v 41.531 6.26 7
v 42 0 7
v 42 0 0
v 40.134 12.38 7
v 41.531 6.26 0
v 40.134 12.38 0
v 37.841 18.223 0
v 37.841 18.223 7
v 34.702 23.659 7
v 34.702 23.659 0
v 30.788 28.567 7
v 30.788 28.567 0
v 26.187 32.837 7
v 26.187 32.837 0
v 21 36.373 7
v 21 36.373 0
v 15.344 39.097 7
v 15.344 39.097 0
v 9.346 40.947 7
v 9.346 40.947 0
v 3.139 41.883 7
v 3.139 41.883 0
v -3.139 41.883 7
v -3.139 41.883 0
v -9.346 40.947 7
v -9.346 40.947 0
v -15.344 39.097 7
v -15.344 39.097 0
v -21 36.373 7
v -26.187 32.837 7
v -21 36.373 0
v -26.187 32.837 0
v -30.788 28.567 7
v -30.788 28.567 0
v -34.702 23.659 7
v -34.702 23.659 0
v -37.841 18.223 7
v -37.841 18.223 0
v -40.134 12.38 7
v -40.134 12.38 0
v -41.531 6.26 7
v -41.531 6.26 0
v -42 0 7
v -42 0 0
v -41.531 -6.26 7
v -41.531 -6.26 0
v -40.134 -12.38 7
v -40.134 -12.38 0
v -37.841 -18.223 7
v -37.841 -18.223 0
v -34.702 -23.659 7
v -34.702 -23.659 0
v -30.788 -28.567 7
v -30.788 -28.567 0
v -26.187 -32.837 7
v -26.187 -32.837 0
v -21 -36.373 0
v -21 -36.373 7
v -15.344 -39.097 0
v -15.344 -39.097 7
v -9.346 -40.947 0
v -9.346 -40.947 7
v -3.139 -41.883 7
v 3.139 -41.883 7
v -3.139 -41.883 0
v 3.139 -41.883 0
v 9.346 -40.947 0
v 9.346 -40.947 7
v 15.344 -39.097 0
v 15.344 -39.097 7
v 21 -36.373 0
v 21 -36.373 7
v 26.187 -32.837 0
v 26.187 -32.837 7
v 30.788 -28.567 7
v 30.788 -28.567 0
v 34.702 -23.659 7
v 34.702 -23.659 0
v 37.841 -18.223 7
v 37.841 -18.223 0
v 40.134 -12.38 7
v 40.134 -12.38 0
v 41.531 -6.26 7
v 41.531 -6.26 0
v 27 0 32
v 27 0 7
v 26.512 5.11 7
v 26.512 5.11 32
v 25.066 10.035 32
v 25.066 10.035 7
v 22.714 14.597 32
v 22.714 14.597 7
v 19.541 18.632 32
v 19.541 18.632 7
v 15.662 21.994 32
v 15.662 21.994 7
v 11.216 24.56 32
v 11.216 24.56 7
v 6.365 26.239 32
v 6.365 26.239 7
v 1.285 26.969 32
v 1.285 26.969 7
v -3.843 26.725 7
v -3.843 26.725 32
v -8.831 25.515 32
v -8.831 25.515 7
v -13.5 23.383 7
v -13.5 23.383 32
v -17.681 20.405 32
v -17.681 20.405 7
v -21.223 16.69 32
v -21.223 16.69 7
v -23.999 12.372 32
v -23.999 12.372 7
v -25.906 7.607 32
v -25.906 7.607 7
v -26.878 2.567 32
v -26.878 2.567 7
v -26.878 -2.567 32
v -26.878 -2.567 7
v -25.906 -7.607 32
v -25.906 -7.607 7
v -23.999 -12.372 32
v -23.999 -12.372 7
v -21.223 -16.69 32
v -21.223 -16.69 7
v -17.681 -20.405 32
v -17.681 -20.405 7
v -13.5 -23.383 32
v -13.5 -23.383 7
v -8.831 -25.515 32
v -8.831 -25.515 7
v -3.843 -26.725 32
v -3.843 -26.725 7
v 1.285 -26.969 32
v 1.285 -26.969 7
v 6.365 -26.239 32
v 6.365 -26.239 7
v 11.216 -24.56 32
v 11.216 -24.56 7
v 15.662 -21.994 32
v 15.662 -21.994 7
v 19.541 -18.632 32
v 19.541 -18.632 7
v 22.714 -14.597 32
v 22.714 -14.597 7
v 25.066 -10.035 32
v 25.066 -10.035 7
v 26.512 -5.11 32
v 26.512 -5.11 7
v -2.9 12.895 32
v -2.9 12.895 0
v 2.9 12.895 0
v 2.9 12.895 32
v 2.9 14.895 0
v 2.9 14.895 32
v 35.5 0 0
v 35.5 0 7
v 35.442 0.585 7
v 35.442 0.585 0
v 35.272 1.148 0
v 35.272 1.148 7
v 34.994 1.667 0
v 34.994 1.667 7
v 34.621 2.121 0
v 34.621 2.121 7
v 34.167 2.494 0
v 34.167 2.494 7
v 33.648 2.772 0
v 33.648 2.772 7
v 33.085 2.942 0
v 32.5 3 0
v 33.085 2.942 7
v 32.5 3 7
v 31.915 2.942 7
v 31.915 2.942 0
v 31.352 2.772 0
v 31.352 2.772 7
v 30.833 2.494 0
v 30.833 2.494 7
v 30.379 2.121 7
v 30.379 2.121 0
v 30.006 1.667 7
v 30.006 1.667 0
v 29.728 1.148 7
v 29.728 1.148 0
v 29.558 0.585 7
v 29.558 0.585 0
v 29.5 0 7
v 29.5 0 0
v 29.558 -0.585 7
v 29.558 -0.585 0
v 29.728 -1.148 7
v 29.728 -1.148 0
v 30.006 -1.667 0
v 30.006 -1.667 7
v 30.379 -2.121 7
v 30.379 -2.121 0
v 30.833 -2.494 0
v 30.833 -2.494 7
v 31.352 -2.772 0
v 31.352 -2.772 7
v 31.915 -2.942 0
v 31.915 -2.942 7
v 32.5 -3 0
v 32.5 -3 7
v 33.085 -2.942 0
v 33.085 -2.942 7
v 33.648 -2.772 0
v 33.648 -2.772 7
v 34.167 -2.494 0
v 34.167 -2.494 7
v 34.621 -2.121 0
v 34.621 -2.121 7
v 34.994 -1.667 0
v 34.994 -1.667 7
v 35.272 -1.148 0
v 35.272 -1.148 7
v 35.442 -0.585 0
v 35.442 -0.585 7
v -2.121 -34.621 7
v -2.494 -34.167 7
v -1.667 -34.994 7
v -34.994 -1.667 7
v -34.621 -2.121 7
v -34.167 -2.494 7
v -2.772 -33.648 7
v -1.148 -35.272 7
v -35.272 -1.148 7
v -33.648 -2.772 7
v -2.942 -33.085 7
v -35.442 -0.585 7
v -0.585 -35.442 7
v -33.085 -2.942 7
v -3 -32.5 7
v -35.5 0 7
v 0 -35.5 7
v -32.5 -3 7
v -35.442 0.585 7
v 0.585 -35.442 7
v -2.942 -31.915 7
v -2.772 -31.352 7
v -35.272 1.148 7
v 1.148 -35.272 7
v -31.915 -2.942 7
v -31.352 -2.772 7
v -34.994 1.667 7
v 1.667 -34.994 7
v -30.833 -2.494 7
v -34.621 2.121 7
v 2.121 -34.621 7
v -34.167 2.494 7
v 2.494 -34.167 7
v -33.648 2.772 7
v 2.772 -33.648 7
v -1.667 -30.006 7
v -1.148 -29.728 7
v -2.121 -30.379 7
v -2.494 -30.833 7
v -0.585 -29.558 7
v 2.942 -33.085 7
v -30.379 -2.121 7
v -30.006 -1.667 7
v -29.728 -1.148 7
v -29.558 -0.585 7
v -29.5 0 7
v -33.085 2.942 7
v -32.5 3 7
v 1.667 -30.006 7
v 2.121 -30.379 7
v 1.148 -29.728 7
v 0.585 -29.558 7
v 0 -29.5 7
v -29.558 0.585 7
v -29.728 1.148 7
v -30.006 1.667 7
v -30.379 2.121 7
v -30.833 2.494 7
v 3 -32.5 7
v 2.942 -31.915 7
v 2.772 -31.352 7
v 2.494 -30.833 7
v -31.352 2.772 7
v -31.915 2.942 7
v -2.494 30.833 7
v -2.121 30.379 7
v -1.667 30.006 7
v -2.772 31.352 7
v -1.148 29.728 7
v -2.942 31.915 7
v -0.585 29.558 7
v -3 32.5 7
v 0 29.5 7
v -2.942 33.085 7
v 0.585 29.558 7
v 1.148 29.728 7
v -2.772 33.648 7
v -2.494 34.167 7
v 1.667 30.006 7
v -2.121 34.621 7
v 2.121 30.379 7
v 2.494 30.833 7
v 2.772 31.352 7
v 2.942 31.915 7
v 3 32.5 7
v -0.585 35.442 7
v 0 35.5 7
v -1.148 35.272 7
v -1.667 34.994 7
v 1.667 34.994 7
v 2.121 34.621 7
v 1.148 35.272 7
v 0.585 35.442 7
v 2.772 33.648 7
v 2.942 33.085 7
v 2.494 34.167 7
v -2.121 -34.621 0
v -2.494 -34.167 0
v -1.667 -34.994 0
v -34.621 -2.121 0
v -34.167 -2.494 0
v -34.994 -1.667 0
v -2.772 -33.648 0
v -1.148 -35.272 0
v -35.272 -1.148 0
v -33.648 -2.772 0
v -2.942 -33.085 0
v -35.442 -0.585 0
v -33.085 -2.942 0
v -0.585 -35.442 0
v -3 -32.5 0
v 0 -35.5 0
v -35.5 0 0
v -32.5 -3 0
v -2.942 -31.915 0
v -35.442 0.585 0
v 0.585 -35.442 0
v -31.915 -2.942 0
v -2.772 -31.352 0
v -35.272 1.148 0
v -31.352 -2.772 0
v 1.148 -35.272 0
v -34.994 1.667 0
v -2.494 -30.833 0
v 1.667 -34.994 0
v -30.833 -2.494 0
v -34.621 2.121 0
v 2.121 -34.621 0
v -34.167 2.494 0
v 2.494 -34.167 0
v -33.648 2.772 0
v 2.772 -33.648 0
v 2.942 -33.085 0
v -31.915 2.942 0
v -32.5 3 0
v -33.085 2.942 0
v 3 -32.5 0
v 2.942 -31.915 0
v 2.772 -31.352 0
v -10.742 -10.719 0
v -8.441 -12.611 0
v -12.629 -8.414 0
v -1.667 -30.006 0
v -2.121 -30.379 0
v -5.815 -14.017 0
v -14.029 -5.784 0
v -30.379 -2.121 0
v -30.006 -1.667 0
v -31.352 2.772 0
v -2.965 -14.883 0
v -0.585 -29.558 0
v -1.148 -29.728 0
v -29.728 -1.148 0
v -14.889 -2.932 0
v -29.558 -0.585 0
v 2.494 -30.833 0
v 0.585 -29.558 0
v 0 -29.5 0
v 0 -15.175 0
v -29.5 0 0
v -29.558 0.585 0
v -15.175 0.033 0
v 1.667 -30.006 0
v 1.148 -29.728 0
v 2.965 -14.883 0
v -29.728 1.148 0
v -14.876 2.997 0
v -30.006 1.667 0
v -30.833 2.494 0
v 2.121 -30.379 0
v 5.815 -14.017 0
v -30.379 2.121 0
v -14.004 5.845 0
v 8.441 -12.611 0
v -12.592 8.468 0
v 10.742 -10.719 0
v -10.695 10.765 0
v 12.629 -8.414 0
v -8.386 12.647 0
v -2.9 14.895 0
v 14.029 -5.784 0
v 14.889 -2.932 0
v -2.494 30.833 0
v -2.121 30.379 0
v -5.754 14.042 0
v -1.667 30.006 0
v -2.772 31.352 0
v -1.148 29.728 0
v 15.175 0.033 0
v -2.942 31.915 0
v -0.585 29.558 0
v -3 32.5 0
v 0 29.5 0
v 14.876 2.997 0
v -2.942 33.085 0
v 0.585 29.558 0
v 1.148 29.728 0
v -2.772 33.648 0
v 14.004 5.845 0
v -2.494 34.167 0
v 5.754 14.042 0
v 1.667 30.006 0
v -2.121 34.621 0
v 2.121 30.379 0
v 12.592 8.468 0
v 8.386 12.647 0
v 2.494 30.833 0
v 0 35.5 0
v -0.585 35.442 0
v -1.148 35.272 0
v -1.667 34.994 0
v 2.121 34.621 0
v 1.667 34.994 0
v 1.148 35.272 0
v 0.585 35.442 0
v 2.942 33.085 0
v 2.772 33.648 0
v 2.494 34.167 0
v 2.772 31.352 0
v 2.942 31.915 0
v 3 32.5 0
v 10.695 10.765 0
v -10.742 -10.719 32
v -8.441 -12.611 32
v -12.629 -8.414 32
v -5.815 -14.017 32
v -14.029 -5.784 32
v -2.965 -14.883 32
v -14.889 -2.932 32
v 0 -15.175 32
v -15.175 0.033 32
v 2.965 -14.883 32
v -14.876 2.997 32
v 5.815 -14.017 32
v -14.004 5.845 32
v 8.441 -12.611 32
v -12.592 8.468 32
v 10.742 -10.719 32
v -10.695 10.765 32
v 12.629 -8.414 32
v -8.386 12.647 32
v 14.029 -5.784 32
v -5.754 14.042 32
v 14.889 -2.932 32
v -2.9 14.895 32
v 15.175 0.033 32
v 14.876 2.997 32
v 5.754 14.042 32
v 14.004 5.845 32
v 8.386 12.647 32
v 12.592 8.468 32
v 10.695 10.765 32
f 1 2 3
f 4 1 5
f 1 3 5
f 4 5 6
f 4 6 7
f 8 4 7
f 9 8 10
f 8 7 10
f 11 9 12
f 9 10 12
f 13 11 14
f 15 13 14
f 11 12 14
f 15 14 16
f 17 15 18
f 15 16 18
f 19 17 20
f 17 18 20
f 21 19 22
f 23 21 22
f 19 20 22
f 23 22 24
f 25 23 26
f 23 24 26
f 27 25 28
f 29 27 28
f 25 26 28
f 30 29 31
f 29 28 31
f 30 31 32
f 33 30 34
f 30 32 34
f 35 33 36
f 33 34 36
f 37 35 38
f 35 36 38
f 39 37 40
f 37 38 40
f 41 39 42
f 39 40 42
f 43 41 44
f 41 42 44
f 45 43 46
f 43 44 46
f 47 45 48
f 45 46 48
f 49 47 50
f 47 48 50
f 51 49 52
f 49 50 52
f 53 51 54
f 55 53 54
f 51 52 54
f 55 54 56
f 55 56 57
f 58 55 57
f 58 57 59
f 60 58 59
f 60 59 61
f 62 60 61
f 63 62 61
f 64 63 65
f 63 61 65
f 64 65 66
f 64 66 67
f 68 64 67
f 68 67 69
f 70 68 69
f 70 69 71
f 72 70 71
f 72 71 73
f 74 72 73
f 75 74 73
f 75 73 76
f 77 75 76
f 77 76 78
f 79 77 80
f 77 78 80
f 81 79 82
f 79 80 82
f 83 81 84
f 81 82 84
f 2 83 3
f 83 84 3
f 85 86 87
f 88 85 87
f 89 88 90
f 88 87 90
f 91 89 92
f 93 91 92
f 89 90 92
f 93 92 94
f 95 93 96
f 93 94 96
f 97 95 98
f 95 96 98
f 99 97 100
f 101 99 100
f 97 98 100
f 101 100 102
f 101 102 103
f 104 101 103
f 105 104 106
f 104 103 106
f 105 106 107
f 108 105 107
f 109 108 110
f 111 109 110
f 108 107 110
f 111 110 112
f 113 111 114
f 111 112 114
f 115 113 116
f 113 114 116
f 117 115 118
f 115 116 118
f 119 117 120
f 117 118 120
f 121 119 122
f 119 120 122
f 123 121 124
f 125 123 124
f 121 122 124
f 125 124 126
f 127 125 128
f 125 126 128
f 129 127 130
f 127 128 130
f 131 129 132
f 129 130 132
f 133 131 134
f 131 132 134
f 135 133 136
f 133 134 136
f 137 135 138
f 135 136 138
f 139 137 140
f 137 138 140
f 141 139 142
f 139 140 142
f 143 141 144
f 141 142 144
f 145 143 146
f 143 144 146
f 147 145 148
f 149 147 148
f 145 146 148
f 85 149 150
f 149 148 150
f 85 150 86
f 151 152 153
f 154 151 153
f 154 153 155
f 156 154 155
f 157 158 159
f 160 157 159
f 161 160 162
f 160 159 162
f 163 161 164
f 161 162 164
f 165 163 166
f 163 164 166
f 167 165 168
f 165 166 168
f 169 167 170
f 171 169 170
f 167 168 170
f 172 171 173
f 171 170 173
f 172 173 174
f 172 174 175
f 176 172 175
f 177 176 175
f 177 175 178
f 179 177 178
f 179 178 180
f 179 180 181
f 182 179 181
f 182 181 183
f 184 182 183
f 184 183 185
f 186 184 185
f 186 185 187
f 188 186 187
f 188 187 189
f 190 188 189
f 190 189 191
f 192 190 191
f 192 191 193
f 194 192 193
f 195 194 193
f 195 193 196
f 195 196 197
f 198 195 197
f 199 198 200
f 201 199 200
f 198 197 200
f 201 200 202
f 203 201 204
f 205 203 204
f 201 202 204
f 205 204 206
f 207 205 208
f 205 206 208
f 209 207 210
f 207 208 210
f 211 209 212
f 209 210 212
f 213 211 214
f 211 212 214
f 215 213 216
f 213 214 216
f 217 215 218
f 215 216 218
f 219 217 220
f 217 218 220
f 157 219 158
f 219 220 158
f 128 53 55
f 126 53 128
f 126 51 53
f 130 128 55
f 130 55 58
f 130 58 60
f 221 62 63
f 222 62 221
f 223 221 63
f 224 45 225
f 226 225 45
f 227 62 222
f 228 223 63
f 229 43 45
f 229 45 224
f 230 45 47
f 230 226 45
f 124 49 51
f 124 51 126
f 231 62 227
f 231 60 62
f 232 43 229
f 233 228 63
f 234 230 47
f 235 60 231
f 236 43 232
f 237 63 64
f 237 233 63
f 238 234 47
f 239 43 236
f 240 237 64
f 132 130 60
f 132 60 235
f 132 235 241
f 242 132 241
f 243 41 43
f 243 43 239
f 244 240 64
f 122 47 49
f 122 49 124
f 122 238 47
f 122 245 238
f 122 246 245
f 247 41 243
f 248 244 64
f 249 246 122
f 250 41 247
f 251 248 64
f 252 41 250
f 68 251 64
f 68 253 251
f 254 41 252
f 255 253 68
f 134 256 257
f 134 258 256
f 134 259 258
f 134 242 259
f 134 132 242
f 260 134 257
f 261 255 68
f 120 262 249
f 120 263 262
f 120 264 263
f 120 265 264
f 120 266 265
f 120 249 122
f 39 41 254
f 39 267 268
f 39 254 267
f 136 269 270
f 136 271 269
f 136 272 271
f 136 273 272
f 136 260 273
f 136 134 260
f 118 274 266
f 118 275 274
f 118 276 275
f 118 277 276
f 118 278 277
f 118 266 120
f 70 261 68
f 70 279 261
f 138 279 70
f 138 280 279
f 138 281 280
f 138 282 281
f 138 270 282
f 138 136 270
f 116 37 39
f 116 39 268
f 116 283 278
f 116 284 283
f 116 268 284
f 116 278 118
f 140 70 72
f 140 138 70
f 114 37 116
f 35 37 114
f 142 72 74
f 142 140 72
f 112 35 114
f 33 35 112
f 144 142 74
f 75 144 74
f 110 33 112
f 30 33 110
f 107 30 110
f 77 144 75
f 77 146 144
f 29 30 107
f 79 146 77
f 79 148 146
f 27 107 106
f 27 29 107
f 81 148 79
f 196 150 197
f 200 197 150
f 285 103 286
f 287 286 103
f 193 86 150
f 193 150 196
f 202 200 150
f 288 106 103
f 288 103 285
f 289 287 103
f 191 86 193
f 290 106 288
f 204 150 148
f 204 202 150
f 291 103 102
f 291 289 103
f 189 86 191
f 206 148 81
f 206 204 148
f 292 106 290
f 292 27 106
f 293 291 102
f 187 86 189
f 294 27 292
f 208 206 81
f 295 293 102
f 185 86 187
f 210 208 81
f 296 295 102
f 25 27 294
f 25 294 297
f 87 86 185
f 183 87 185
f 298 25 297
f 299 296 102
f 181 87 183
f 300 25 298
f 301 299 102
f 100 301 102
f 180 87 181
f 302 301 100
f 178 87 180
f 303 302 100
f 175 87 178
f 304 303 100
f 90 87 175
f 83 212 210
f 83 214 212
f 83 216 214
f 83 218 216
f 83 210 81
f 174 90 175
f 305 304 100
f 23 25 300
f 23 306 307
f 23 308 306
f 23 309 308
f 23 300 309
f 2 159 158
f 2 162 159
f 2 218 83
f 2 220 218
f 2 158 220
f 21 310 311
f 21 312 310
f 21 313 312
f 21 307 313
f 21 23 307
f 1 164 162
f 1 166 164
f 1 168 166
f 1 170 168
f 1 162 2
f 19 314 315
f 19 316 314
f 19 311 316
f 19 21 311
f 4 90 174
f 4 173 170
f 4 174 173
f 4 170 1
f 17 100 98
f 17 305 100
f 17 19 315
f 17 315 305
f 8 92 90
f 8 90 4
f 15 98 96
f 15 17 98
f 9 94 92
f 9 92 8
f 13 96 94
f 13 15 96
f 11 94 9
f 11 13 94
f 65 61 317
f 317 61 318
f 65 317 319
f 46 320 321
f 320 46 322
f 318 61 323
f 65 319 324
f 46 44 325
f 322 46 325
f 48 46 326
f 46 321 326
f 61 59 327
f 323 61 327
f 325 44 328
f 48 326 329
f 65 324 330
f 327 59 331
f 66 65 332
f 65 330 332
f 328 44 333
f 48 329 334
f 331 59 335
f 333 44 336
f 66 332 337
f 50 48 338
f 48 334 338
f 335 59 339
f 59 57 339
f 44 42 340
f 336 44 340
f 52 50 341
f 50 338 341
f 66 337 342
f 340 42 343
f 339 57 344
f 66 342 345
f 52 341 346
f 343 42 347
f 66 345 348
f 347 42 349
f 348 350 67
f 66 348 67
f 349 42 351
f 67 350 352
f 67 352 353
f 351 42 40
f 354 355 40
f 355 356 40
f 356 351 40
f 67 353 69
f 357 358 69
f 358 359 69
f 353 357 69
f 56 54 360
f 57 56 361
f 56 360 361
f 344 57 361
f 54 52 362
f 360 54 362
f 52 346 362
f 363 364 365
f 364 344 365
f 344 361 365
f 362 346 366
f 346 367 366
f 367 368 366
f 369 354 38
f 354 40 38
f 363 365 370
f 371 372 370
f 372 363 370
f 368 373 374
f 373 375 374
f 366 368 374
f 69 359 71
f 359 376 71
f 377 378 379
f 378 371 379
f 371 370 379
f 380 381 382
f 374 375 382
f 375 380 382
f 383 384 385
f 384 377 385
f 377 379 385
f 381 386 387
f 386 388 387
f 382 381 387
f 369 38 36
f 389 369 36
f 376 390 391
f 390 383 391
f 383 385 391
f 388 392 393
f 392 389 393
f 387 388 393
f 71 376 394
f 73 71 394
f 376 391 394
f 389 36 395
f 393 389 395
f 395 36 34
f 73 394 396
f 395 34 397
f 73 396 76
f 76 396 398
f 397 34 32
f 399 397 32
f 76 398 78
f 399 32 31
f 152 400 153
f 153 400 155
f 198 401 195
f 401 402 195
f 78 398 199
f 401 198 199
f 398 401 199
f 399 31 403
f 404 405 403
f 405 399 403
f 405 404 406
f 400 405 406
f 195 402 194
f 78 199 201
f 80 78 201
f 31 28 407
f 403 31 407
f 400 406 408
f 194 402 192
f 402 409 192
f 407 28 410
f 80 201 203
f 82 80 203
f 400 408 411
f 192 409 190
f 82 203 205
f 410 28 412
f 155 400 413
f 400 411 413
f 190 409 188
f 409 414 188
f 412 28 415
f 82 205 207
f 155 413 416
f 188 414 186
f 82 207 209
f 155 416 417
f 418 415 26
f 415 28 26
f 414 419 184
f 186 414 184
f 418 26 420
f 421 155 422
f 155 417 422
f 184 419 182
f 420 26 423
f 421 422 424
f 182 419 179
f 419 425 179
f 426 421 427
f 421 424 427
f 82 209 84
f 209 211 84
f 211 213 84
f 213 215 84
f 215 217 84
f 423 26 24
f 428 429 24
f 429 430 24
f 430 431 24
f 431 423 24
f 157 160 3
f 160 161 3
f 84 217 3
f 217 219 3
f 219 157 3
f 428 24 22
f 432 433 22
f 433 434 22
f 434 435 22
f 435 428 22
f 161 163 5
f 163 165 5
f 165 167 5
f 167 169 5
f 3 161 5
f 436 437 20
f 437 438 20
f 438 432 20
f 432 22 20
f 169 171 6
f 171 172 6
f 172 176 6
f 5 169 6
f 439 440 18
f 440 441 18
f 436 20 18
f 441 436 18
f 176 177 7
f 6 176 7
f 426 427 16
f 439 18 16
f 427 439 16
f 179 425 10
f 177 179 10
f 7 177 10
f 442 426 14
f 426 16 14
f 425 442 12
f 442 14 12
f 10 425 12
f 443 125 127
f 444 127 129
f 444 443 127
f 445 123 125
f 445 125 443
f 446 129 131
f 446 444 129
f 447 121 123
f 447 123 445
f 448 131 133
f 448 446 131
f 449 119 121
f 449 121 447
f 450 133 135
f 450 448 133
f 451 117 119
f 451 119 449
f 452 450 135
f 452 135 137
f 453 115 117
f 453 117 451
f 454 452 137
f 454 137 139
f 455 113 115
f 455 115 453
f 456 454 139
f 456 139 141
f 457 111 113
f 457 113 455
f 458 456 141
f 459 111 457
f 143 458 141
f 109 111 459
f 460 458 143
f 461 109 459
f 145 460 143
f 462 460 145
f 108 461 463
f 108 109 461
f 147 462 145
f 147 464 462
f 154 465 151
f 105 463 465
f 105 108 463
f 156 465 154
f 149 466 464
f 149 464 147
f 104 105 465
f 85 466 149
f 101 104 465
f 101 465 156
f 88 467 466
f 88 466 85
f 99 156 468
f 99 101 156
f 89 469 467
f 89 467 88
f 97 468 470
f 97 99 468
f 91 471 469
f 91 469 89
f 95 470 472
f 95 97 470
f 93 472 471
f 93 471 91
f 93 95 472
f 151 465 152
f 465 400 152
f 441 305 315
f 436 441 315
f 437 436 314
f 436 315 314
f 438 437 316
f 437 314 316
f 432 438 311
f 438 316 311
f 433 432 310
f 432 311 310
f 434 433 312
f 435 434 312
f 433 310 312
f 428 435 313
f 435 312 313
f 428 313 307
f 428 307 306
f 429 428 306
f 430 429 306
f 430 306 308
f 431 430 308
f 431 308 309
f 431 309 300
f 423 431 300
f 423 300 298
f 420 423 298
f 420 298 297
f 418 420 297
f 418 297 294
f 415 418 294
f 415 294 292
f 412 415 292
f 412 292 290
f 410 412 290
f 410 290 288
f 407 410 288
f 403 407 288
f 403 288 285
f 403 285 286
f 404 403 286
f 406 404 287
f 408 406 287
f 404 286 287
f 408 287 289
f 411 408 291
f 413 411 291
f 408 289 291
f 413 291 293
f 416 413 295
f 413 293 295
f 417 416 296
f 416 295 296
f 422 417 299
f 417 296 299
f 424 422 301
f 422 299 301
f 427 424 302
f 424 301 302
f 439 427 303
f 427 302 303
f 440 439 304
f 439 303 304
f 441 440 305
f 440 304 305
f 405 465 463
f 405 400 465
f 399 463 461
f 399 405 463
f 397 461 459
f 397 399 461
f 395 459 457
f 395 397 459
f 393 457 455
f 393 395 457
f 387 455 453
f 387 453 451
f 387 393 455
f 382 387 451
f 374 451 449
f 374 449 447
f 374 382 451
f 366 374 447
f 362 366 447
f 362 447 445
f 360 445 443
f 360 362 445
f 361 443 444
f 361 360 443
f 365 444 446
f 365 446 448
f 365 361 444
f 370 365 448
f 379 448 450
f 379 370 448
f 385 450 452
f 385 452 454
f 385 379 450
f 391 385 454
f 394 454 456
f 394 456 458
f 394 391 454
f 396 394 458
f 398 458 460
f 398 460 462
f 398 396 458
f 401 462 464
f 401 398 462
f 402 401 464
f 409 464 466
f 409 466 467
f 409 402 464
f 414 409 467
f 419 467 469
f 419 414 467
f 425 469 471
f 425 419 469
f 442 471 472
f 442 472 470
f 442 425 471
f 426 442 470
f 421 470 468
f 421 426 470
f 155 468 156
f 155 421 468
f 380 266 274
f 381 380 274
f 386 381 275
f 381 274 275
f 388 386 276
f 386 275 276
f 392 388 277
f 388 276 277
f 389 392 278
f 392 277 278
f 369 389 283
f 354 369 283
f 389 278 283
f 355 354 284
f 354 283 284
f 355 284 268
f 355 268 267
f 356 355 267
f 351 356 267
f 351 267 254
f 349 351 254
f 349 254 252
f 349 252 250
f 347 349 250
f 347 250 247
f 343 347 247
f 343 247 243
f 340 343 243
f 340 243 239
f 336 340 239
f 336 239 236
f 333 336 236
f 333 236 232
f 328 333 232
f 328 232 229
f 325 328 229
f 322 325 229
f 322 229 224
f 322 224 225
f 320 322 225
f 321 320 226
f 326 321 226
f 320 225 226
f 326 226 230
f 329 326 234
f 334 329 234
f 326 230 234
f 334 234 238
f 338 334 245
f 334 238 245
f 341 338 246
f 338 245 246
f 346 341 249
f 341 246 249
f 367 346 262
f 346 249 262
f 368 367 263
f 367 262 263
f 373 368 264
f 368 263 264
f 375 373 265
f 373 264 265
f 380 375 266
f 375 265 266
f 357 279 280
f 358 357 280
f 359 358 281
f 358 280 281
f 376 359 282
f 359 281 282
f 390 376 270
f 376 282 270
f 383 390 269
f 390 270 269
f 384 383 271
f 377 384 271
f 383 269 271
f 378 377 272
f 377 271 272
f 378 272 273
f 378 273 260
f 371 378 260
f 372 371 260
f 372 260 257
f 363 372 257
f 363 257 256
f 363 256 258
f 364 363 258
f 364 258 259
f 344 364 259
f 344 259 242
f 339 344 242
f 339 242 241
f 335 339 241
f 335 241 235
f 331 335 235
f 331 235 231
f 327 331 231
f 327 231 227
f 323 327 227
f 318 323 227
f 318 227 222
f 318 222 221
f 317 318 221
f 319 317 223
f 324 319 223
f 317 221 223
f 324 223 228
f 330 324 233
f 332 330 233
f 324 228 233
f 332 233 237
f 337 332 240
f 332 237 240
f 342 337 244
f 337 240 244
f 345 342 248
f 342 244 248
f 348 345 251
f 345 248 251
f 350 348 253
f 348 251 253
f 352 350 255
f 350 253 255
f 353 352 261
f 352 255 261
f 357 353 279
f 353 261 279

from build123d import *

# Parameters (mm, degrees)
SKETCH_R     = 42
PAD_DEPTH    = 7
SKETCH003_R  = 27
PAD001_DEPTH = 25
SKETCH004_R  = 3
HOLE_DEPTH   = 25


with BuildPart() as part:
    # Sketch → Pad (new body)
    with BuildSketch(Plane.XY):
        Circle(SKETCH_R)
        with BuildLine():
            Line((-2.9, 14.895322), (-2.9, 12.895322))
            Line((-2.9, 12.895322), (2.9, 12.895322))
            Line((2.9, 12.895322), (2.9, 14.895322))
            ThreePointArc((-2.9, 14.895322), (0, -15.175), (2.9, 14.895322))
        make_face(mode=Mode.SUBTRACT)
    extrude(amount=PAD_DEPTH)

    # Sketch003 (on Face7 of Pad) → Pad001 (join)
    with BuildSketch(Plane.XY.offset(7)):
        Circle(SKETCH003_R)
        with BuildLine():
            ThreePointArc((-2.9, 14.895322), (0, -15.175), (2.9, 14.895322))
            Line((2.9, 12.895322), (2.9, 14.895322))
            Line((-2.9, 12.895322), (2.9, 12.895322))
            Line((-2.9, 14.895322), (-2.9, 12.895322))
        make_face(mode=Mode.SUBTRACT)
    extrude(amount=PAD001_DEPTH)

    # Sketch004 (on Face3 of Pad001) → Hole (cut)
    with BuildSketch(Plane.XY.offset(7)):
        with Locations((0, 32.5)):
            Circle(SKETCH004_R)
        with Locations((0, -32.5)):
            Circle(SKETCH004_R)
        with Locations((32.5, 0)):
            Circle(SKETCH004_R)
        with Locations((-32.5, 0)):
            Circle(SKETCH004_R)
    extrude(amount=-HOLE_DEPTH, mode=Mode.SUBTRACT)


solid = part.part
